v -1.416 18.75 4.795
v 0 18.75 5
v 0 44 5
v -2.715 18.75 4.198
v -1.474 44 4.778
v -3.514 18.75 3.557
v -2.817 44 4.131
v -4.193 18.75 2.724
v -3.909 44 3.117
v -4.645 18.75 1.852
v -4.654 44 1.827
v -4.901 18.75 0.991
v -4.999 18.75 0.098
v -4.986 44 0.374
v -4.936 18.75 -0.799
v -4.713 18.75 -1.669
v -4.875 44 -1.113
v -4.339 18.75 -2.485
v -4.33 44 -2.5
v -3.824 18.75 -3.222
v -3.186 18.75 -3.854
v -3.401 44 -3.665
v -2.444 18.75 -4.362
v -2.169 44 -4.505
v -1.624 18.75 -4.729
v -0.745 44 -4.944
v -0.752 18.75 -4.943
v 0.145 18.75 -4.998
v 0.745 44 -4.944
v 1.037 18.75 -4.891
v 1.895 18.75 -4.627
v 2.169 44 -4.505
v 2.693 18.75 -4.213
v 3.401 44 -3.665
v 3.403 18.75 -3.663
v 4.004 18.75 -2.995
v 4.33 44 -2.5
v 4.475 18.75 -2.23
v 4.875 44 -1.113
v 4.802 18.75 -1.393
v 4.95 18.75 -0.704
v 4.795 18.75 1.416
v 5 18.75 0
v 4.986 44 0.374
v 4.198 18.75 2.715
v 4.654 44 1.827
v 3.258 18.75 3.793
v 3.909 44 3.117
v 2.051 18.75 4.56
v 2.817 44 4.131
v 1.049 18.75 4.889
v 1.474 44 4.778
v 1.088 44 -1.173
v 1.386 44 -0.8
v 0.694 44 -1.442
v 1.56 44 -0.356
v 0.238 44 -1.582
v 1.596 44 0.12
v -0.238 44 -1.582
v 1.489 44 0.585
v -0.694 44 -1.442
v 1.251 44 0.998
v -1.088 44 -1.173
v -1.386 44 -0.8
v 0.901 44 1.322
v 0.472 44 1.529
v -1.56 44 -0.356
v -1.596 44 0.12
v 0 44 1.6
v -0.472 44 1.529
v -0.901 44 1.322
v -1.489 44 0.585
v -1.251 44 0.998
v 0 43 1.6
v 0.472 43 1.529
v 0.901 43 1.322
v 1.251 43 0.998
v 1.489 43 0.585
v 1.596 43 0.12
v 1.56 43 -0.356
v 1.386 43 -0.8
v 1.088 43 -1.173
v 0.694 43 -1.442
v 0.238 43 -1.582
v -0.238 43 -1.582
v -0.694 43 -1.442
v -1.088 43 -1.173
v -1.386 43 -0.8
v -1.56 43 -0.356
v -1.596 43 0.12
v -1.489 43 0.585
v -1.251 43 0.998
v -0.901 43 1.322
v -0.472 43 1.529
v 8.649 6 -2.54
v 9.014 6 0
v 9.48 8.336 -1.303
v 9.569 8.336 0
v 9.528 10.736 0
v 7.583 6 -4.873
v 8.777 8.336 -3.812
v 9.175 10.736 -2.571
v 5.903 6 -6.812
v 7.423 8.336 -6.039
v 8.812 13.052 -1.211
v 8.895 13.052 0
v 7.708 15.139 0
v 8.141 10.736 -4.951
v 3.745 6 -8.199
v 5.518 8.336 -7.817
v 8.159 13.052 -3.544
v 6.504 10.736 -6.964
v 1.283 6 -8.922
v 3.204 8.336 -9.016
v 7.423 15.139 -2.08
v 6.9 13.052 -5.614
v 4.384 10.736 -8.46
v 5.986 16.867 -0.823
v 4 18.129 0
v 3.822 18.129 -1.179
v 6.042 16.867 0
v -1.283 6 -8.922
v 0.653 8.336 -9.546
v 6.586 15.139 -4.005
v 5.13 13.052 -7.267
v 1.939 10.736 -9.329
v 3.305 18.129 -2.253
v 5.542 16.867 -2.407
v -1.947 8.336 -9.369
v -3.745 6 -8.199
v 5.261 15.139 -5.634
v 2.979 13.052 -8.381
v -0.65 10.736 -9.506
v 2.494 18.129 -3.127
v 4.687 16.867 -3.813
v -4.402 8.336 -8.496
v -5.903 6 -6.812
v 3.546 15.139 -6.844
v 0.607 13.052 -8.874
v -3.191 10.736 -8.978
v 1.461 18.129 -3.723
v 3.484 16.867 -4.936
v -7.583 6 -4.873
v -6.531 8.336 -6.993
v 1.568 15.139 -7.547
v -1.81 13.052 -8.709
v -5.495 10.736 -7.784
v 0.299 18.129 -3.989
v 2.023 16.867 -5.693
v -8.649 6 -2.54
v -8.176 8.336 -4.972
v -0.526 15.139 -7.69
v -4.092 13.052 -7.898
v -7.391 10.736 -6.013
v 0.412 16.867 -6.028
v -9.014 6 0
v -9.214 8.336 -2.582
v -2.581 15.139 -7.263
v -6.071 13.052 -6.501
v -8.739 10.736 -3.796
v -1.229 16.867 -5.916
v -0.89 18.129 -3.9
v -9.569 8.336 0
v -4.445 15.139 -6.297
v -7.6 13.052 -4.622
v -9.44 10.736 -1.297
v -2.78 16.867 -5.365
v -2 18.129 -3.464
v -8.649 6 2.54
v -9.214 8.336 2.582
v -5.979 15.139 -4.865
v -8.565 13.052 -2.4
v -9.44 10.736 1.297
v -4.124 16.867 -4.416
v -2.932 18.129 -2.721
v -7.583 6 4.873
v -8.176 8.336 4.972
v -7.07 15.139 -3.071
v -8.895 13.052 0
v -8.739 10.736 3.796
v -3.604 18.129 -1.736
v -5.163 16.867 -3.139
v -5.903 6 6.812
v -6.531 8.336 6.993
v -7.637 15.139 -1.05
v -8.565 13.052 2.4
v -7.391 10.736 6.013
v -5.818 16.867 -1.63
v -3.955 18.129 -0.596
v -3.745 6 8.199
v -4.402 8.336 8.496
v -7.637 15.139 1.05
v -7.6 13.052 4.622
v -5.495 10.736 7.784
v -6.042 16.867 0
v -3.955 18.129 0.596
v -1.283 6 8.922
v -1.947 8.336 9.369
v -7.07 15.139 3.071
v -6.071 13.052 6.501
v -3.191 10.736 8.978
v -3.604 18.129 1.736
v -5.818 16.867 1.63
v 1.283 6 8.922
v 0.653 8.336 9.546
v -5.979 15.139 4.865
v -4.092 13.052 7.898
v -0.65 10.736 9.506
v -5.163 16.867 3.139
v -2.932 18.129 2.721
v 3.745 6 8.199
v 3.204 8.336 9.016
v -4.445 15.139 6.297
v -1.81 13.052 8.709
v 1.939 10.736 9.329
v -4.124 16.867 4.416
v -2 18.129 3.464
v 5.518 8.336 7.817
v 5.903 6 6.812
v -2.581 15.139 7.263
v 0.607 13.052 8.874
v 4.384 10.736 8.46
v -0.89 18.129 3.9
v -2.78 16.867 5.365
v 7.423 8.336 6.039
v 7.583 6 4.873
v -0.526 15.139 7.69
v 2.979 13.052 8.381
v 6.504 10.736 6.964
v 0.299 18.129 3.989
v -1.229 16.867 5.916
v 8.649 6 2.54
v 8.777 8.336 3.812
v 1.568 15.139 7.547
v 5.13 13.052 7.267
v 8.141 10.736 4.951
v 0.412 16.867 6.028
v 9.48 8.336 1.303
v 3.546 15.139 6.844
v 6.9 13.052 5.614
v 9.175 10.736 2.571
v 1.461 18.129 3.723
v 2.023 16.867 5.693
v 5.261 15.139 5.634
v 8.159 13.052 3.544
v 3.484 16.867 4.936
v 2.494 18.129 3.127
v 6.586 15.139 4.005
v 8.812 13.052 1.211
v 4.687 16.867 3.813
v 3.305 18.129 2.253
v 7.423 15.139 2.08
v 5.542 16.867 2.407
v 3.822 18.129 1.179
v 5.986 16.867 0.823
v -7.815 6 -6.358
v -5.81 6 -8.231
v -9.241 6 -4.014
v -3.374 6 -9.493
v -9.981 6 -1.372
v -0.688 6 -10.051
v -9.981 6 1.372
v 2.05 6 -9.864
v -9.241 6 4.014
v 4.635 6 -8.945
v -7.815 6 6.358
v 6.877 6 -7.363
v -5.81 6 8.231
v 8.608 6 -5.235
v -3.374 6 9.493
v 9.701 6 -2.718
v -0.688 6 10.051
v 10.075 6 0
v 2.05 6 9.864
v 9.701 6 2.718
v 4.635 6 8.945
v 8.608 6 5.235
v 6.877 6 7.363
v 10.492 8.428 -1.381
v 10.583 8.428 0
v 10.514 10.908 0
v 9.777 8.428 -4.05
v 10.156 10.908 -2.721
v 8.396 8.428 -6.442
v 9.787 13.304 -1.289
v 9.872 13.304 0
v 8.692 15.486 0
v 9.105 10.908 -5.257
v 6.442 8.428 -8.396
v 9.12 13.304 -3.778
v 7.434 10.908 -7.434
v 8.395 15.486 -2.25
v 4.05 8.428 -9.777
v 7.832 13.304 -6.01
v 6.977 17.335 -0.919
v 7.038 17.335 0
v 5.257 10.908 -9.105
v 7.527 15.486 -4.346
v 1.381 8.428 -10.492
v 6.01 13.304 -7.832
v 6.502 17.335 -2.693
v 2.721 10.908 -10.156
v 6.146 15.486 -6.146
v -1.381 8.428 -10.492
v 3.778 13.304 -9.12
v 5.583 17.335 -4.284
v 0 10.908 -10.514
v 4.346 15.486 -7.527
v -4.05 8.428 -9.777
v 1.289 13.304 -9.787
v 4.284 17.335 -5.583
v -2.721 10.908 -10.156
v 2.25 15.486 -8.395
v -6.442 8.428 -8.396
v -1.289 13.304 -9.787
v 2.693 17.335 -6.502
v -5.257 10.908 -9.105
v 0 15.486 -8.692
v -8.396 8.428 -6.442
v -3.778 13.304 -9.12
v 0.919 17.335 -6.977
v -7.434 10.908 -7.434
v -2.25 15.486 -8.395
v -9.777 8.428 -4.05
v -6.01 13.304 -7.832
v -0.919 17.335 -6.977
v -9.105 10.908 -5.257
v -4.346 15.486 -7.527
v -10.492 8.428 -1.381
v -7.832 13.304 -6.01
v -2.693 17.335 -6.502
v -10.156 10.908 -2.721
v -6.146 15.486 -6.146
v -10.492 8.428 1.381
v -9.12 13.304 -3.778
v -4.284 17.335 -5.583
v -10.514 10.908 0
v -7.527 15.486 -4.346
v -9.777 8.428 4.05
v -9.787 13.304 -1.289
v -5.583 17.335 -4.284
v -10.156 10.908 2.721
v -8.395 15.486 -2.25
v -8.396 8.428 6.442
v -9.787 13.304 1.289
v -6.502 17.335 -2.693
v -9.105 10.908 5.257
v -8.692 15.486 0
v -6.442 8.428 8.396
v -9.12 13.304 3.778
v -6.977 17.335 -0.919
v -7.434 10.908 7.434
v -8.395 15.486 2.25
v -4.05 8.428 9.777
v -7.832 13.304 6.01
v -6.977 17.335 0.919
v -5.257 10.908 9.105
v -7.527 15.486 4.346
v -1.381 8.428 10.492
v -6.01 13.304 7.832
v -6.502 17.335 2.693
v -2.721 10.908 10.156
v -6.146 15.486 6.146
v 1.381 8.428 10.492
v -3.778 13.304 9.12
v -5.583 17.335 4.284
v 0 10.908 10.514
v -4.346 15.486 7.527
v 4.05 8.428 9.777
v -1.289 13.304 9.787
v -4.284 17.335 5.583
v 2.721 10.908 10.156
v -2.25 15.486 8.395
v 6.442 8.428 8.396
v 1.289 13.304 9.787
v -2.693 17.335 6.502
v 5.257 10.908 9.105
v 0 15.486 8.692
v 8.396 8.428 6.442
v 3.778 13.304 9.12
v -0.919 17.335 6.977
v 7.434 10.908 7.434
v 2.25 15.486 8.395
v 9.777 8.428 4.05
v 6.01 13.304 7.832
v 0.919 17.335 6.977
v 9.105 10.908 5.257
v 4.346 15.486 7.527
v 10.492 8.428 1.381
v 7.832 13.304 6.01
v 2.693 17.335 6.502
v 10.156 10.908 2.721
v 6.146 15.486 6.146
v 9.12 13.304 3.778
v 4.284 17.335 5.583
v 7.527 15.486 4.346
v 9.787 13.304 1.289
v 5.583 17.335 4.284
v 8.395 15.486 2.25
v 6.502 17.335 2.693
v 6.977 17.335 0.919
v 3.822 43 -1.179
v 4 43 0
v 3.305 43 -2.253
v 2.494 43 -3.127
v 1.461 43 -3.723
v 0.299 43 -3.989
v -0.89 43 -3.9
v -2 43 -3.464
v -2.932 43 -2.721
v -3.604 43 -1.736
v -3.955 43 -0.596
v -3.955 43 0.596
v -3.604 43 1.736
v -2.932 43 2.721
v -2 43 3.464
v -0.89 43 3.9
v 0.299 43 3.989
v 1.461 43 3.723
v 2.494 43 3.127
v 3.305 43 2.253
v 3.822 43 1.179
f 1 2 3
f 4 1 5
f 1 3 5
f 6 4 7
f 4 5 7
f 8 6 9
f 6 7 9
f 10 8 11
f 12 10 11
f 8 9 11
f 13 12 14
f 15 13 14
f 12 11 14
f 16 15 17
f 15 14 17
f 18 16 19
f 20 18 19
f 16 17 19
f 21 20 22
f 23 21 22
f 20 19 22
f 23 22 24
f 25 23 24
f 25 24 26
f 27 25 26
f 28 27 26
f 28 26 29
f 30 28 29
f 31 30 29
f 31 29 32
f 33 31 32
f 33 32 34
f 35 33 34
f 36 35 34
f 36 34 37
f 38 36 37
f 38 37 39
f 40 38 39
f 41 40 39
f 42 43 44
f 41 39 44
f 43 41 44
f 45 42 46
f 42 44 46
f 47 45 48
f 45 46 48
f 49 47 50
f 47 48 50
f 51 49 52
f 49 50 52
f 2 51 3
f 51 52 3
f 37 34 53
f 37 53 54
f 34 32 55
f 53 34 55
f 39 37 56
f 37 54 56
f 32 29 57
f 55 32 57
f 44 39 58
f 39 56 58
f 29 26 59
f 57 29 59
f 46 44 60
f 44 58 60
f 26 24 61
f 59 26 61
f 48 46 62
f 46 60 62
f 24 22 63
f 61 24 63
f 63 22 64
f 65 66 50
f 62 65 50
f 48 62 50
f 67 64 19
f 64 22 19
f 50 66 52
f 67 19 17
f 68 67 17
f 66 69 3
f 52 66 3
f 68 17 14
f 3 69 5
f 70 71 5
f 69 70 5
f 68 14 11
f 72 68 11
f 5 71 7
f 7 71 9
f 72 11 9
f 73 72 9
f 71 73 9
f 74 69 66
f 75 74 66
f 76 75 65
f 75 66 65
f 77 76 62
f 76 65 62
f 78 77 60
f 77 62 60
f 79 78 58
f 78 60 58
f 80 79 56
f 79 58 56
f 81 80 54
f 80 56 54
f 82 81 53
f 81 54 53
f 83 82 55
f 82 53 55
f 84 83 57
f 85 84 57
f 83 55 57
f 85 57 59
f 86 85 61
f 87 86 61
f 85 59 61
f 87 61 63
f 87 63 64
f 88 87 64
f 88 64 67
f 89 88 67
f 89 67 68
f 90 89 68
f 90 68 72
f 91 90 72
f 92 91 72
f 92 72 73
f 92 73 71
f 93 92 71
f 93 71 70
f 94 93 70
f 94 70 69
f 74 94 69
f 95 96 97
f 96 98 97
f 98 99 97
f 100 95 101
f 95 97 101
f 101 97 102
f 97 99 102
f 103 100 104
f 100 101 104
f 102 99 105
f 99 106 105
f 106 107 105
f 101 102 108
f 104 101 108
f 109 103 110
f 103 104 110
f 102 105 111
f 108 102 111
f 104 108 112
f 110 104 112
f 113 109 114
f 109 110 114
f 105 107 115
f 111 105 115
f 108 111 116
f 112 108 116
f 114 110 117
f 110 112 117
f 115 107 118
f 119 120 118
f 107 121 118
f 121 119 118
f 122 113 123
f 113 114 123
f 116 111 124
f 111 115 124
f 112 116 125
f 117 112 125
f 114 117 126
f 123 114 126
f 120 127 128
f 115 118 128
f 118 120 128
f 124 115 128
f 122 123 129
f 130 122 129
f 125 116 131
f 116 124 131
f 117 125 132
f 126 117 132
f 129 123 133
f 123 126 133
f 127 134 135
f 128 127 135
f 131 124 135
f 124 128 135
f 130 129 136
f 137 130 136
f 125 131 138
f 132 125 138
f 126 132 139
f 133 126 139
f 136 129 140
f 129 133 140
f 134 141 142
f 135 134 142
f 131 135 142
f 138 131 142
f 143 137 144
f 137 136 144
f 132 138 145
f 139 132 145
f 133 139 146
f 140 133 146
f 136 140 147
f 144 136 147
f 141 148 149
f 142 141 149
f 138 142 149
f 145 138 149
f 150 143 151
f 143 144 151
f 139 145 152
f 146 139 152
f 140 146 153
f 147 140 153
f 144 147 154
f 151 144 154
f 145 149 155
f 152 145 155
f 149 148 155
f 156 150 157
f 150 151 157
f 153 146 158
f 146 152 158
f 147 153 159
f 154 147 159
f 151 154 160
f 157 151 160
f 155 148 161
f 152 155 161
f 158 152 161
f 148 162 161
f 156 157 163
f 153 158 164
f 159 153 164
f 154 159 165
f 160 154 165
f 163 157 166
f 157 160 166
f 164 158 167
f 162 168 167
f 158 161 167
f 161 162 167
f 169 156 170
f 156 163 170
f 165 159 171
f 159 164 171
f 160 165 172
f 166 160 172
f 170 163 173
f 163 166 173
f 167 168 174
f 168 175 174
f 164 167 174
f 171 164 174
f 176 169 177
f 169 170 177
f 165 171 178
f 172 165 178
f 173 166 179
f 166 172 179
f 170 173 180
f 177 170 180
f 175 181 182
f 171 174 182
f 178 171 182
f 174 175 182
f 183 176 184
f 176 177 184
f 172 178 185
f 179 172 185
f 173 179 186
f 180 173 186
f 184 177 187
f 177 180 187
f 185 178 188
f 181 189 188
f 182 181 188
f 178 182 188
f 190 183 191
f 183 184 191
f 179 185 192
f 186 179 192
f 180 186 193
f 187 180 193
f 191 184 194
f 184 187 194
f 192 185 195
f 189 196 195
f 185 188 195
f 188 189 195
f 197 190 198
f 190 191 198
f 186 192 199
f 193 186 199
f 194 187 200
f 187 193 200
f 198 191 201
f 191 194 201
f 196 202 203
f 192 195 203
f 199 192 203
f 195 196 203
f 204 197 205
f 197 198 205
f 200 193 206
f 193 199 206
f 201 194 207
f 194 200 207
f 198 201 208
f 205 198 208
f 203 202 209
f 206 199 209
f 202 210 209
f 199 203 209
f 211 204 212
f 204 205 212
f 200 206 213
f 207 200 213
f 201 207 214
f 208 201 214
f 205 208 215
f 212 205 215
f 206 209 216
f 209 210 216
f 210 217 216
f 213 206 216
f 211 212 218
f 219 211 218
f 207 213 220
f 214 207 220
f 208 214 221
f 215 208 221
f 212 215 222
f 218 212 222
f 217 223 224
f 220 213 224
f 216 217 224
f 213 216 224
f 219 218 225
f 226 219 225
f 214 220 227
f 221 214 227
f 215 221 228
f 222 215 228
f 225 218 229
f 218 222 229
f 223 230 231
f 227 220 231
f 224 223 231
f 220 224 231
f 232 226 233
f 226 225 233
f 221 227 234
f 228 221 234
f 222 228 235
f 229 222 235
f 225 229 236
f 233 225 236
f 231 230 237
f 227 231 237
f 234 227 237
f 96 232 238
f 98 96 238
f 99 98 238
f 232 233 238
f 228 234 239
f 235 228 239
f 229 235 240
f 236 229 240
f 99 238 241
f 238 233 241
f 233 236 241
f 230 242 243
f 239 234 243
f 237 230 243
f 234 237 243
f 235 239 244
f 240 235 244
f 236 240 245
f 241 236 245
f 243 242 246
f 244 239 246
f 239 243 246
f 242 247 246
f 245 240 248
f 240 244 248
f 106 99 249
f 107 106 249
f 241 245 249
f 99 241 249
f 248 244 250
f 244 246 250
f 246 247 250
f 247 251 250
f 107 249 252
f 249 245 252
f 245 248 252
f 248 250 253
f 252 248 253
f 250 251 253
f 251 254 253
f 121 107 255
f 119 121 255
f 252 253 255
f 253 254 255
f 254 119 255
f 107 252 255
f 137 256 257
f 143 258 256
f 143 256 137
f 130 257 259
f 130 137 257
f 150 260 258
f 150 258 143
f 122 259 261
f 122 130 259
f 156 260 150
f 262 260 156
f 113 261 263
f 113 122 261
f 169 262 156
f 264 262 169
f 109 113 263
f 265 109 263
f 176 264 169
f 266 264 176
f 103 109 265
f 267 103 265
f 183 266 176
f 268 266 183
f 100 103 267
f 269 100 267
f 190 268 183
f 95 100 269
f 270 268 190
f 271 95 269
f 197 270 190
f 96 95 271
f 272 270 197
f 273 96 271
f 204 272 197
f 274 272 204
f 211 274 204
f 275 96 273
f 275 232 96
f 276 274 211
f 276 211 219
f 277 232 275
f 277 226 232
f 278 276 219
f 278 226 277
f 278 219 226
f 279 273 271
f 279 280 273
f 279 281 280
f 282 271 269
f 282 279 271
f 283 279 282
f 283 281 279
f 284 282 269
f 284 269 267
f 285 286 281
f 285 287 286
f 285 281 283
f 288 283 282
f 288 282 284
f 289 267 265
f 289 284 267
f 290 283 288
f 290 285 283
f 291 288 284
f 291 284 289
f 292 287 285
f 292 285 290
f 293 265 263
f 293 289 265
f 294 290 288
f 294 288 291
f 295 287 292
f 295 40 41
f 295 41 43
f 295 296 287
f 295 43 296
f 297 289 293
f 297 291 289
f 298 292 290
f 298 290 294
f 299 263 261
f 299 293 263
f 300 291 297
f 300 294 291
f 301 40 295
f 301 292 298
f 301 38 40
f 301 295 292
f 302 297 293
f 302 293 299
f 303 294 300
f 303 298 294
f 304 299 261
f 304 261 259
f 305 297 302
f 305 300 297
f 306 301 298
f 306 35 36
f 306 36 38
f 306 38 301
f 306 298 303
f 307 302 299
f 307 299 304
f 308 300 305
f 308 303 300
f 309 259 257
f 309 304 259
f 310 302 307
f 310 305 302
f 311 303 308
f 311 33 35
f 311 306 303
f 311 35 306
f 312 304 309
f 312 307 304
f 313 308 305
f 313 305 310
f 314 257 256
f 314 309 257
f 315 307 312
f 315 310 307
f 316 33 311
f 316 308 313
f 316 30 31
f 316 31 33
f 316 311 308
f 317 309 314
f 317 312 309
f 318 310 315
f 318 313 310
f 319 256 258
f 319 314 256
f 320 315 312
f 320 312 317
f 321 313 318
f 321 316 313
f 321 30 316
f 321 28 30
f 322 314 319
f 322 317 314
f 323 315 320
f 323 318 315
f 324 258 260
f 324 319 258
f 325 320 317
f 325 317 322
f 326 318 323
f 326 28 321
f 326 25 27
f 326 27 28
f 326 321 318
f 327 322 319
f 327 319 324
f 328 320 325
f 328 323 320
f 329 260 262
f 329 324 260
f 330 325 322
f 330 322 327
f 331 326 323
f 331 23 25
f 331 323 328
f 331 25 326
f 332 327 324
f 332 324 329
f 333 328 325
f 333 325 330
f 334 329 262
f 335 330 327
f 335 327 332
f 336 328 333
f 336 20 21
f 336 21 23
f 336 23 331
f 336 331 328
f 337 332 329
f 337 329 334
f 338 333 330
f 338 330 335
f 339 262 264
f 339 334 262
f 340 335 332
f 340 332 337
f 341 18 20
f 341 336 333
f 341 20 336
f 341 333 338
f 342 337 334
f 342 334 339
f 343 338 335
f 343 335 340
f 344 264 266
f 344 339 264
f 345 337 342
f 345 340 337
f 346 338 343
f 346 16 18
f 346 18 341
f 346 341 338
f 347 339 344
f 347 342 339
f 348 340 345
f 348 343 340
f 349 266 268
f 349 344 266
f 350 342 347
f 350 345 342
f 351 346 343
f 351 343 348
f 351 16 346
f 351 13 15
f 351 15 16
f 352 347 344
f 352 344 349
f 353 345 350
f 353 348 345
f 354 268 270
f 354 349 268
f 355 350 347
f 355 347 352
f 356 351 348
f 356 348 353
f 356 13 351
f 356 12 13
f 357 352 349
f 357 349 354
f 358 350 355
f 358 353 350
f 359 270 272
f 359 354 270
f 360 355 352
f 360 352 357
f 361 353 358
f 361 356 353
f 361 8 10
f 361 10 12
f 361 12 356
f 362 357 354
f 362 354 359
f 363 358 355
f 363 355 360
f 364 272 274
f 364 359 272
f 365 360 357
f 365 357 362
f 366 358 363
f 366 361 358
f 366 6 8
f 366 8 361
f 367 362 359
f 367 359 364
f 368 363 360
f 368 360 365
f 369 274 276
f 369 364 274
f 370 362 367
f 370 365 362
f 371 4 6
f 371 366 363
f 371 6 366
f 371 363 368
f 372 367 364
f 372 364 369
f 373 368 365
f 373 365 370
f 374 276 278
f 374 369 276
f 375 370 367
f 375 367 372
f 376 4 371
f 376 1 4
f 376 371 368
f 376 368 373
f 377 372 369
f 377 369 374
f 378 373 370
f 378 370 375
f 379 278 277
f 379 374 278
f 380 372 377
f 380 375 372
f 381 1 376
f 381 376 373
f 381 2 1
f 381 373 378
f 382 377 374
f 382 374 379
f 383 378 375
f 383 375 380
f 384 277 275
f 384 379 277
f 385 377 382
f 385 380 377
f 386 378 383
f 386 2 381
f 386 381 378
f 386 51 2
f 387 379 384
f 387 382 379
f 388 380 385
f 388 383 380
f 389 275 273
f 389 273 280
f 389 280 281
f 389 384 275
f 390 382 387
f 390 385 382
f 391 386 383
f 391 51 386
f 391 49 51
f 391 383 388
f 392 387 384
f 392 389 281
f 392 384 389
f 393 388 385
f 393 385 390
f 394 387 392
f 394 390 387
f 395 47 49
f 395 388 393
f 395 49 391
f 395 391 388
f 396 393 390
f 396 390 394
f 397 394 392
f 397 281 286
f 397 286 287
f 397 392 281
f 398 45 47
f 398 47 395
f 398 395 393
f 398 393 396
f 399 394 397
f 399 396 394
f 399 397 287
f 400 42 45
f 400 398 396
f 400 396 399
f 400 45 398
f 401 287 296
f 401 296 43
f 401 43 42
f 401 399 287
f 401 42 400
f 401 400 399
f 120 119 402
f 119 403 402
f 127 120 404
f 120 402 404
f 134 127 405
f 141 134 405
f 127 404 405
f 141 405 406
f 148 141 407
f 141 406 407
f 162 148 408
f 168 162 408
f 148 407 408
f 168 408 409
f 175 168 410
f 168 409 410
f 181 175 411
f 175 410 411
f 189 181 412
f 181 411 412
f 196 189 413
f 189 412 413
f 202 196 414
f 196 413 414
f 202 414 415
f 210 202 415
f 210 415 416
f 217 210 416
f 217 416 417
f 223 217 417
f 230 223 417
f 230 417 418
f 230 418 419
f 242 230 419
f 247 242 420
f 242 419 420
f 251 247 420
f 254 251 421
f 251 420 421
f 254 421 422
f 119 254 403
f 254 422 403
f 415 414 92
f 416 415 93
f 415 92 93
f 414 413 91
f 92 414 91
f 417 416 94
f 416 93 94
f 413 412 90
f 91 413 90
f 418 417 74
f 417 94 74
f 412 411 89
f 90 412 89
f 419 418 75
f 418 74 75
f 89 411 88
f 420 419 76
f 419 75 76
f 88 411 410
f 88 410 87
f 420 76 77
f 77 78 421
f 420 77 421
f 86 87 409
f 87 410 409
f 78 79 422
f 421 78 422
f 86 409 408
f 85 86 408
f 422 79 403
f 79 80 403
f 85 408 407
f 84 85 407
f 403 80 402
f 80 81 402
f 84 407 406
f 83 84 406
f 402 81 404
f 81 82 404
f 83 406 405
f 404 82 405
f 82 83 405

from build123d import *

# Parameters (mm, degrees)
ESBO_O1_R                = 5
RESSALTO_EXTRUS_O1_DEPTH = 30
RESSALTO_EXTRUS_O4_START = -74
ESBO_O4_R                = 5
RESSALTO_EXTRUS_O4_DEPTH = 74
ESBO_O3_R                = 71.162261847
CORTE_EXTRUS_O2_DEPTH    = 36
CORTE_EXTRUS_O3_REACH    = 42.863
ESBO_O6_R                = 1.6


# Read off the part's stored shape, not the designer's step: Domo1, Casca3
with BuildPart() as part:
    # Esboço1 → Ressalto-extrusão1 (new body)
    with BuildSketch(Plane(origin=(0, 0, 0), x_dir=(1, 0, 0), z_dir=(0, 1, 0))):
        with Locations(Location((0, 0, 0), (0, 0, 270))):
            Circle(ESBO_O1_R)
    extrude(amount=-RESSALTO_EXTRUS_O1_DEPTH)

    # Domo1 outline → Domo1 (revolve)
    with BuildSketch(Plane.XY):
        with BuildLine():
            Line((0, 0), (4.999999996, -3e-09))
            ThreePointArc((4.999999996, -3e-09), (10.307764064, 11.951941013), (0, 20))
            Line((0, 20), (0, 0))
        make_face()
    revolve(axis=Axis((0, 0, 0), (0, 1, 0)))

    # Esboço4 → Ressalto-extrusão4 (add)
    with BuildSketch(Plane.XZ.offset(30).offset(RESSALTO_EXTRUS_O4_START)):
        with Locations(Location((0, 0, 0), (0, 0, 90))):
            Circle(ESBO_O4_R)
    extrude(amount=RESSALTO_EXTRUS_O4_DEPTH)

    # Esboço3 → Corte-extrusão2 (cut)
    with BuildSketch(Plane.XZ.offset(30)):
        Circle(ESBO_O3_R)
    extrude(amount=-CORTE_EXTRUS_O2_DEPTH, mode=Mode.SUBTRACT)

    # Casca3 outline → Casca3 (revolve, cut)
    with BuildSketch(Plane.XY):
        with BuildLine():
            Line((3.999999997, 18.129463148), (4, 43))
            Line((4, 43), (0, 43))
            Line((0, 43), (0, 5.999999991))
            Line((0, 5.999999991), (9.013878185, 5.999999991))
            ThreePointArc((9.013878185, 5.999999991), (8.895011268, 13.051873609), (3.999999997, 18.129463148))
        make_face()
    revolve(axis=Axis((0, 0, 0), (0, 1, 0)), mode=Mode.SUBTRACT)

    # Esboço6 → Corte-extrusão3 (cut, up to next)
    with BuildSketch(Plane(origin=(0, 44, 0), x_dir=(1, 0, 0), z_dir=(0, 1, 0)), mode=Mode.PRIVATE) as corte_extrus_o3_sk1:
        with Locations(Location((0, 0, 0), (0, 0, 270))):
            Circle(ESBO_O6_R)
    corte_extrus_o3_tool1 = extrude(corte_extrus_o3_sk1.sketch, amount=-CORTE_EXTRUS_O3_REACH, mode=Mode.PRIVATE) & part.part
    add(corte_extrus_o3_tool1.solids().sort_by_distance((0, 44, 0))[0], mode=Mode.SUBTRACT)


solid = part.part
